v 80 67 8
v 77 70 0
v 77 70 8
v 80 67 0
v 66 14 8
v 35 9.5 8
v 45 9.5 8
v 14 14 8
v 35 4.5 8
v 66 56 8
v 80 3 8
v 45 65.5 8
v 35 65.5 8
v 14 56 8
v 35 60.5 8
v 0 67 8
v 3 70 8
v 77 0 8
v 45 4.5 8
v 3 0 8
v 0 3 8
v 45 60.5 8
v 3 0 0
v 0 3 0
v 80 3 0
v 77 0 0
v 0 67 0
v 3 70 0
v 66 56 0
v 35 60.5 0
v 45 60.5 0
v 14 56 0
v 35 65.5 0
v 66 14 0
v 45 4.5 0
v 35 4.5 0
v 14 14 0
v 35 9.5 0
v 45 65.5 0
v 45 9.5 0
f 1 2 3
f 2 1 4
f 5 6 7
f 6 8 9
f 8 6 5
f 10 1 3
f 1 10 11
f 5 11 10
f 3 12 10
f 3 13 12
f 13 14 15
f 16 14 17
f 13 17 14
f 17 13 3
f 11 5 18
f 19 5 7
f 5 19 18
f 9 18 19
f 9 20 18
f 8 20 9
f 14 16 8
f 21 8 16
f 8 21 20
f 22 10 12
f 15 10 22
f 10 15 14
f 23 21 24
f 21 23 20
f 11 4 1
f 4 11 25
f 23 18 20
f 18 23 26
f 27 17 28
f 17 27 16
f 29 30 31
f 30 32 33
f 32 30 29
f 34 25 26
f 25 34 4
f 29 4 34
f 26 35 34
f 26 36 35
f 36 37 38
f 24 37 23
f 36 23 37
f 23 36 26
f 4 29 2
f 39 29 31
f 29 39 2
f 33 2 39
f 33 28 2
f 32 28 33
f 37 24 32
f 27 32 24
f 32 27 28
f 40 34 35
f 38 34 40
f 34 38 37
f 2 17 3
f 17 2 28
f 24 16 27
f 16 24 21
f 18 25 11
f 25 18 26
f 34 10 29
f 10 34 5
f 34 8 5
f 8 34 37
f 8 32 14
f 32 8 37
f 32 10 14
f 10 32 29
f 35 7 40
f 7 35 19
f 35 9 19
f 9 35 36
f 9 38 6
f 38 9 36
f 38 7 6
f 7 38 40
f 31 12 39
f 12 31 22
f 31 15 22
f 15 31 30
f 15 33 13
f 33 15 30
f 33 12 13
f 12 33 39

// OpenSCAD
$fn = 32;

// ----------------------------------------------------------------------
// Frame plate: 80 x 70 frame, 14 mm rails
// ----------------------------------------------------------------------

// --- parameters (mm) ---
plate_l = 80;             // plate length, X
plate_w = 70;             // plate width, Y
plate_t = 8;              // plate thickness, Z (extrusion height)
corner_c = 3;             // corner chamfer
frame_bar = 14;           // frame rail width
slot_l = 10;              // adjustment slot length
slot_w = 5;               // adjustment slot width

win_l = plate_l - 2 * frame_bar;  // window length
win_w = plate_w - 2 * frame_bar;  // window width

profile = [[3, 0], [77, 0], [80, 3], [80, 67], [77, 70], [3, 70], [0, 67], [0, 3]];  // primary outline, 8 points, counter clockwise
void_1 = [[14, 14], [66, 14], [66, 56], [14, 56]];  // the window, 4 points
void_2 = [[35, 4.5], [45, 4.5], [45, 9.5], [35, 9.5]];  // adjustment slot, 4 points
void_3 = [[35, 60.5], [45, 60.5], [45, 65.5], [35, 65.5]];  // adjustment slot, 4 points

// --- the one profile operation ---
difference() {
  linear_extrude(height = plate_t) polygon(points = profile);
  translate([0, 0, -1])
    linear_extrude(height = plate_t + 2) polygon(points = void_1);
  translate([0, 0, -1])
    linear_extrude(height = plate_t + 2) polygon(points = void_2);
  translate([0, 0, -1])
    linear_extrude(height = plate_t + 2) polygon(points = void_3);
}
